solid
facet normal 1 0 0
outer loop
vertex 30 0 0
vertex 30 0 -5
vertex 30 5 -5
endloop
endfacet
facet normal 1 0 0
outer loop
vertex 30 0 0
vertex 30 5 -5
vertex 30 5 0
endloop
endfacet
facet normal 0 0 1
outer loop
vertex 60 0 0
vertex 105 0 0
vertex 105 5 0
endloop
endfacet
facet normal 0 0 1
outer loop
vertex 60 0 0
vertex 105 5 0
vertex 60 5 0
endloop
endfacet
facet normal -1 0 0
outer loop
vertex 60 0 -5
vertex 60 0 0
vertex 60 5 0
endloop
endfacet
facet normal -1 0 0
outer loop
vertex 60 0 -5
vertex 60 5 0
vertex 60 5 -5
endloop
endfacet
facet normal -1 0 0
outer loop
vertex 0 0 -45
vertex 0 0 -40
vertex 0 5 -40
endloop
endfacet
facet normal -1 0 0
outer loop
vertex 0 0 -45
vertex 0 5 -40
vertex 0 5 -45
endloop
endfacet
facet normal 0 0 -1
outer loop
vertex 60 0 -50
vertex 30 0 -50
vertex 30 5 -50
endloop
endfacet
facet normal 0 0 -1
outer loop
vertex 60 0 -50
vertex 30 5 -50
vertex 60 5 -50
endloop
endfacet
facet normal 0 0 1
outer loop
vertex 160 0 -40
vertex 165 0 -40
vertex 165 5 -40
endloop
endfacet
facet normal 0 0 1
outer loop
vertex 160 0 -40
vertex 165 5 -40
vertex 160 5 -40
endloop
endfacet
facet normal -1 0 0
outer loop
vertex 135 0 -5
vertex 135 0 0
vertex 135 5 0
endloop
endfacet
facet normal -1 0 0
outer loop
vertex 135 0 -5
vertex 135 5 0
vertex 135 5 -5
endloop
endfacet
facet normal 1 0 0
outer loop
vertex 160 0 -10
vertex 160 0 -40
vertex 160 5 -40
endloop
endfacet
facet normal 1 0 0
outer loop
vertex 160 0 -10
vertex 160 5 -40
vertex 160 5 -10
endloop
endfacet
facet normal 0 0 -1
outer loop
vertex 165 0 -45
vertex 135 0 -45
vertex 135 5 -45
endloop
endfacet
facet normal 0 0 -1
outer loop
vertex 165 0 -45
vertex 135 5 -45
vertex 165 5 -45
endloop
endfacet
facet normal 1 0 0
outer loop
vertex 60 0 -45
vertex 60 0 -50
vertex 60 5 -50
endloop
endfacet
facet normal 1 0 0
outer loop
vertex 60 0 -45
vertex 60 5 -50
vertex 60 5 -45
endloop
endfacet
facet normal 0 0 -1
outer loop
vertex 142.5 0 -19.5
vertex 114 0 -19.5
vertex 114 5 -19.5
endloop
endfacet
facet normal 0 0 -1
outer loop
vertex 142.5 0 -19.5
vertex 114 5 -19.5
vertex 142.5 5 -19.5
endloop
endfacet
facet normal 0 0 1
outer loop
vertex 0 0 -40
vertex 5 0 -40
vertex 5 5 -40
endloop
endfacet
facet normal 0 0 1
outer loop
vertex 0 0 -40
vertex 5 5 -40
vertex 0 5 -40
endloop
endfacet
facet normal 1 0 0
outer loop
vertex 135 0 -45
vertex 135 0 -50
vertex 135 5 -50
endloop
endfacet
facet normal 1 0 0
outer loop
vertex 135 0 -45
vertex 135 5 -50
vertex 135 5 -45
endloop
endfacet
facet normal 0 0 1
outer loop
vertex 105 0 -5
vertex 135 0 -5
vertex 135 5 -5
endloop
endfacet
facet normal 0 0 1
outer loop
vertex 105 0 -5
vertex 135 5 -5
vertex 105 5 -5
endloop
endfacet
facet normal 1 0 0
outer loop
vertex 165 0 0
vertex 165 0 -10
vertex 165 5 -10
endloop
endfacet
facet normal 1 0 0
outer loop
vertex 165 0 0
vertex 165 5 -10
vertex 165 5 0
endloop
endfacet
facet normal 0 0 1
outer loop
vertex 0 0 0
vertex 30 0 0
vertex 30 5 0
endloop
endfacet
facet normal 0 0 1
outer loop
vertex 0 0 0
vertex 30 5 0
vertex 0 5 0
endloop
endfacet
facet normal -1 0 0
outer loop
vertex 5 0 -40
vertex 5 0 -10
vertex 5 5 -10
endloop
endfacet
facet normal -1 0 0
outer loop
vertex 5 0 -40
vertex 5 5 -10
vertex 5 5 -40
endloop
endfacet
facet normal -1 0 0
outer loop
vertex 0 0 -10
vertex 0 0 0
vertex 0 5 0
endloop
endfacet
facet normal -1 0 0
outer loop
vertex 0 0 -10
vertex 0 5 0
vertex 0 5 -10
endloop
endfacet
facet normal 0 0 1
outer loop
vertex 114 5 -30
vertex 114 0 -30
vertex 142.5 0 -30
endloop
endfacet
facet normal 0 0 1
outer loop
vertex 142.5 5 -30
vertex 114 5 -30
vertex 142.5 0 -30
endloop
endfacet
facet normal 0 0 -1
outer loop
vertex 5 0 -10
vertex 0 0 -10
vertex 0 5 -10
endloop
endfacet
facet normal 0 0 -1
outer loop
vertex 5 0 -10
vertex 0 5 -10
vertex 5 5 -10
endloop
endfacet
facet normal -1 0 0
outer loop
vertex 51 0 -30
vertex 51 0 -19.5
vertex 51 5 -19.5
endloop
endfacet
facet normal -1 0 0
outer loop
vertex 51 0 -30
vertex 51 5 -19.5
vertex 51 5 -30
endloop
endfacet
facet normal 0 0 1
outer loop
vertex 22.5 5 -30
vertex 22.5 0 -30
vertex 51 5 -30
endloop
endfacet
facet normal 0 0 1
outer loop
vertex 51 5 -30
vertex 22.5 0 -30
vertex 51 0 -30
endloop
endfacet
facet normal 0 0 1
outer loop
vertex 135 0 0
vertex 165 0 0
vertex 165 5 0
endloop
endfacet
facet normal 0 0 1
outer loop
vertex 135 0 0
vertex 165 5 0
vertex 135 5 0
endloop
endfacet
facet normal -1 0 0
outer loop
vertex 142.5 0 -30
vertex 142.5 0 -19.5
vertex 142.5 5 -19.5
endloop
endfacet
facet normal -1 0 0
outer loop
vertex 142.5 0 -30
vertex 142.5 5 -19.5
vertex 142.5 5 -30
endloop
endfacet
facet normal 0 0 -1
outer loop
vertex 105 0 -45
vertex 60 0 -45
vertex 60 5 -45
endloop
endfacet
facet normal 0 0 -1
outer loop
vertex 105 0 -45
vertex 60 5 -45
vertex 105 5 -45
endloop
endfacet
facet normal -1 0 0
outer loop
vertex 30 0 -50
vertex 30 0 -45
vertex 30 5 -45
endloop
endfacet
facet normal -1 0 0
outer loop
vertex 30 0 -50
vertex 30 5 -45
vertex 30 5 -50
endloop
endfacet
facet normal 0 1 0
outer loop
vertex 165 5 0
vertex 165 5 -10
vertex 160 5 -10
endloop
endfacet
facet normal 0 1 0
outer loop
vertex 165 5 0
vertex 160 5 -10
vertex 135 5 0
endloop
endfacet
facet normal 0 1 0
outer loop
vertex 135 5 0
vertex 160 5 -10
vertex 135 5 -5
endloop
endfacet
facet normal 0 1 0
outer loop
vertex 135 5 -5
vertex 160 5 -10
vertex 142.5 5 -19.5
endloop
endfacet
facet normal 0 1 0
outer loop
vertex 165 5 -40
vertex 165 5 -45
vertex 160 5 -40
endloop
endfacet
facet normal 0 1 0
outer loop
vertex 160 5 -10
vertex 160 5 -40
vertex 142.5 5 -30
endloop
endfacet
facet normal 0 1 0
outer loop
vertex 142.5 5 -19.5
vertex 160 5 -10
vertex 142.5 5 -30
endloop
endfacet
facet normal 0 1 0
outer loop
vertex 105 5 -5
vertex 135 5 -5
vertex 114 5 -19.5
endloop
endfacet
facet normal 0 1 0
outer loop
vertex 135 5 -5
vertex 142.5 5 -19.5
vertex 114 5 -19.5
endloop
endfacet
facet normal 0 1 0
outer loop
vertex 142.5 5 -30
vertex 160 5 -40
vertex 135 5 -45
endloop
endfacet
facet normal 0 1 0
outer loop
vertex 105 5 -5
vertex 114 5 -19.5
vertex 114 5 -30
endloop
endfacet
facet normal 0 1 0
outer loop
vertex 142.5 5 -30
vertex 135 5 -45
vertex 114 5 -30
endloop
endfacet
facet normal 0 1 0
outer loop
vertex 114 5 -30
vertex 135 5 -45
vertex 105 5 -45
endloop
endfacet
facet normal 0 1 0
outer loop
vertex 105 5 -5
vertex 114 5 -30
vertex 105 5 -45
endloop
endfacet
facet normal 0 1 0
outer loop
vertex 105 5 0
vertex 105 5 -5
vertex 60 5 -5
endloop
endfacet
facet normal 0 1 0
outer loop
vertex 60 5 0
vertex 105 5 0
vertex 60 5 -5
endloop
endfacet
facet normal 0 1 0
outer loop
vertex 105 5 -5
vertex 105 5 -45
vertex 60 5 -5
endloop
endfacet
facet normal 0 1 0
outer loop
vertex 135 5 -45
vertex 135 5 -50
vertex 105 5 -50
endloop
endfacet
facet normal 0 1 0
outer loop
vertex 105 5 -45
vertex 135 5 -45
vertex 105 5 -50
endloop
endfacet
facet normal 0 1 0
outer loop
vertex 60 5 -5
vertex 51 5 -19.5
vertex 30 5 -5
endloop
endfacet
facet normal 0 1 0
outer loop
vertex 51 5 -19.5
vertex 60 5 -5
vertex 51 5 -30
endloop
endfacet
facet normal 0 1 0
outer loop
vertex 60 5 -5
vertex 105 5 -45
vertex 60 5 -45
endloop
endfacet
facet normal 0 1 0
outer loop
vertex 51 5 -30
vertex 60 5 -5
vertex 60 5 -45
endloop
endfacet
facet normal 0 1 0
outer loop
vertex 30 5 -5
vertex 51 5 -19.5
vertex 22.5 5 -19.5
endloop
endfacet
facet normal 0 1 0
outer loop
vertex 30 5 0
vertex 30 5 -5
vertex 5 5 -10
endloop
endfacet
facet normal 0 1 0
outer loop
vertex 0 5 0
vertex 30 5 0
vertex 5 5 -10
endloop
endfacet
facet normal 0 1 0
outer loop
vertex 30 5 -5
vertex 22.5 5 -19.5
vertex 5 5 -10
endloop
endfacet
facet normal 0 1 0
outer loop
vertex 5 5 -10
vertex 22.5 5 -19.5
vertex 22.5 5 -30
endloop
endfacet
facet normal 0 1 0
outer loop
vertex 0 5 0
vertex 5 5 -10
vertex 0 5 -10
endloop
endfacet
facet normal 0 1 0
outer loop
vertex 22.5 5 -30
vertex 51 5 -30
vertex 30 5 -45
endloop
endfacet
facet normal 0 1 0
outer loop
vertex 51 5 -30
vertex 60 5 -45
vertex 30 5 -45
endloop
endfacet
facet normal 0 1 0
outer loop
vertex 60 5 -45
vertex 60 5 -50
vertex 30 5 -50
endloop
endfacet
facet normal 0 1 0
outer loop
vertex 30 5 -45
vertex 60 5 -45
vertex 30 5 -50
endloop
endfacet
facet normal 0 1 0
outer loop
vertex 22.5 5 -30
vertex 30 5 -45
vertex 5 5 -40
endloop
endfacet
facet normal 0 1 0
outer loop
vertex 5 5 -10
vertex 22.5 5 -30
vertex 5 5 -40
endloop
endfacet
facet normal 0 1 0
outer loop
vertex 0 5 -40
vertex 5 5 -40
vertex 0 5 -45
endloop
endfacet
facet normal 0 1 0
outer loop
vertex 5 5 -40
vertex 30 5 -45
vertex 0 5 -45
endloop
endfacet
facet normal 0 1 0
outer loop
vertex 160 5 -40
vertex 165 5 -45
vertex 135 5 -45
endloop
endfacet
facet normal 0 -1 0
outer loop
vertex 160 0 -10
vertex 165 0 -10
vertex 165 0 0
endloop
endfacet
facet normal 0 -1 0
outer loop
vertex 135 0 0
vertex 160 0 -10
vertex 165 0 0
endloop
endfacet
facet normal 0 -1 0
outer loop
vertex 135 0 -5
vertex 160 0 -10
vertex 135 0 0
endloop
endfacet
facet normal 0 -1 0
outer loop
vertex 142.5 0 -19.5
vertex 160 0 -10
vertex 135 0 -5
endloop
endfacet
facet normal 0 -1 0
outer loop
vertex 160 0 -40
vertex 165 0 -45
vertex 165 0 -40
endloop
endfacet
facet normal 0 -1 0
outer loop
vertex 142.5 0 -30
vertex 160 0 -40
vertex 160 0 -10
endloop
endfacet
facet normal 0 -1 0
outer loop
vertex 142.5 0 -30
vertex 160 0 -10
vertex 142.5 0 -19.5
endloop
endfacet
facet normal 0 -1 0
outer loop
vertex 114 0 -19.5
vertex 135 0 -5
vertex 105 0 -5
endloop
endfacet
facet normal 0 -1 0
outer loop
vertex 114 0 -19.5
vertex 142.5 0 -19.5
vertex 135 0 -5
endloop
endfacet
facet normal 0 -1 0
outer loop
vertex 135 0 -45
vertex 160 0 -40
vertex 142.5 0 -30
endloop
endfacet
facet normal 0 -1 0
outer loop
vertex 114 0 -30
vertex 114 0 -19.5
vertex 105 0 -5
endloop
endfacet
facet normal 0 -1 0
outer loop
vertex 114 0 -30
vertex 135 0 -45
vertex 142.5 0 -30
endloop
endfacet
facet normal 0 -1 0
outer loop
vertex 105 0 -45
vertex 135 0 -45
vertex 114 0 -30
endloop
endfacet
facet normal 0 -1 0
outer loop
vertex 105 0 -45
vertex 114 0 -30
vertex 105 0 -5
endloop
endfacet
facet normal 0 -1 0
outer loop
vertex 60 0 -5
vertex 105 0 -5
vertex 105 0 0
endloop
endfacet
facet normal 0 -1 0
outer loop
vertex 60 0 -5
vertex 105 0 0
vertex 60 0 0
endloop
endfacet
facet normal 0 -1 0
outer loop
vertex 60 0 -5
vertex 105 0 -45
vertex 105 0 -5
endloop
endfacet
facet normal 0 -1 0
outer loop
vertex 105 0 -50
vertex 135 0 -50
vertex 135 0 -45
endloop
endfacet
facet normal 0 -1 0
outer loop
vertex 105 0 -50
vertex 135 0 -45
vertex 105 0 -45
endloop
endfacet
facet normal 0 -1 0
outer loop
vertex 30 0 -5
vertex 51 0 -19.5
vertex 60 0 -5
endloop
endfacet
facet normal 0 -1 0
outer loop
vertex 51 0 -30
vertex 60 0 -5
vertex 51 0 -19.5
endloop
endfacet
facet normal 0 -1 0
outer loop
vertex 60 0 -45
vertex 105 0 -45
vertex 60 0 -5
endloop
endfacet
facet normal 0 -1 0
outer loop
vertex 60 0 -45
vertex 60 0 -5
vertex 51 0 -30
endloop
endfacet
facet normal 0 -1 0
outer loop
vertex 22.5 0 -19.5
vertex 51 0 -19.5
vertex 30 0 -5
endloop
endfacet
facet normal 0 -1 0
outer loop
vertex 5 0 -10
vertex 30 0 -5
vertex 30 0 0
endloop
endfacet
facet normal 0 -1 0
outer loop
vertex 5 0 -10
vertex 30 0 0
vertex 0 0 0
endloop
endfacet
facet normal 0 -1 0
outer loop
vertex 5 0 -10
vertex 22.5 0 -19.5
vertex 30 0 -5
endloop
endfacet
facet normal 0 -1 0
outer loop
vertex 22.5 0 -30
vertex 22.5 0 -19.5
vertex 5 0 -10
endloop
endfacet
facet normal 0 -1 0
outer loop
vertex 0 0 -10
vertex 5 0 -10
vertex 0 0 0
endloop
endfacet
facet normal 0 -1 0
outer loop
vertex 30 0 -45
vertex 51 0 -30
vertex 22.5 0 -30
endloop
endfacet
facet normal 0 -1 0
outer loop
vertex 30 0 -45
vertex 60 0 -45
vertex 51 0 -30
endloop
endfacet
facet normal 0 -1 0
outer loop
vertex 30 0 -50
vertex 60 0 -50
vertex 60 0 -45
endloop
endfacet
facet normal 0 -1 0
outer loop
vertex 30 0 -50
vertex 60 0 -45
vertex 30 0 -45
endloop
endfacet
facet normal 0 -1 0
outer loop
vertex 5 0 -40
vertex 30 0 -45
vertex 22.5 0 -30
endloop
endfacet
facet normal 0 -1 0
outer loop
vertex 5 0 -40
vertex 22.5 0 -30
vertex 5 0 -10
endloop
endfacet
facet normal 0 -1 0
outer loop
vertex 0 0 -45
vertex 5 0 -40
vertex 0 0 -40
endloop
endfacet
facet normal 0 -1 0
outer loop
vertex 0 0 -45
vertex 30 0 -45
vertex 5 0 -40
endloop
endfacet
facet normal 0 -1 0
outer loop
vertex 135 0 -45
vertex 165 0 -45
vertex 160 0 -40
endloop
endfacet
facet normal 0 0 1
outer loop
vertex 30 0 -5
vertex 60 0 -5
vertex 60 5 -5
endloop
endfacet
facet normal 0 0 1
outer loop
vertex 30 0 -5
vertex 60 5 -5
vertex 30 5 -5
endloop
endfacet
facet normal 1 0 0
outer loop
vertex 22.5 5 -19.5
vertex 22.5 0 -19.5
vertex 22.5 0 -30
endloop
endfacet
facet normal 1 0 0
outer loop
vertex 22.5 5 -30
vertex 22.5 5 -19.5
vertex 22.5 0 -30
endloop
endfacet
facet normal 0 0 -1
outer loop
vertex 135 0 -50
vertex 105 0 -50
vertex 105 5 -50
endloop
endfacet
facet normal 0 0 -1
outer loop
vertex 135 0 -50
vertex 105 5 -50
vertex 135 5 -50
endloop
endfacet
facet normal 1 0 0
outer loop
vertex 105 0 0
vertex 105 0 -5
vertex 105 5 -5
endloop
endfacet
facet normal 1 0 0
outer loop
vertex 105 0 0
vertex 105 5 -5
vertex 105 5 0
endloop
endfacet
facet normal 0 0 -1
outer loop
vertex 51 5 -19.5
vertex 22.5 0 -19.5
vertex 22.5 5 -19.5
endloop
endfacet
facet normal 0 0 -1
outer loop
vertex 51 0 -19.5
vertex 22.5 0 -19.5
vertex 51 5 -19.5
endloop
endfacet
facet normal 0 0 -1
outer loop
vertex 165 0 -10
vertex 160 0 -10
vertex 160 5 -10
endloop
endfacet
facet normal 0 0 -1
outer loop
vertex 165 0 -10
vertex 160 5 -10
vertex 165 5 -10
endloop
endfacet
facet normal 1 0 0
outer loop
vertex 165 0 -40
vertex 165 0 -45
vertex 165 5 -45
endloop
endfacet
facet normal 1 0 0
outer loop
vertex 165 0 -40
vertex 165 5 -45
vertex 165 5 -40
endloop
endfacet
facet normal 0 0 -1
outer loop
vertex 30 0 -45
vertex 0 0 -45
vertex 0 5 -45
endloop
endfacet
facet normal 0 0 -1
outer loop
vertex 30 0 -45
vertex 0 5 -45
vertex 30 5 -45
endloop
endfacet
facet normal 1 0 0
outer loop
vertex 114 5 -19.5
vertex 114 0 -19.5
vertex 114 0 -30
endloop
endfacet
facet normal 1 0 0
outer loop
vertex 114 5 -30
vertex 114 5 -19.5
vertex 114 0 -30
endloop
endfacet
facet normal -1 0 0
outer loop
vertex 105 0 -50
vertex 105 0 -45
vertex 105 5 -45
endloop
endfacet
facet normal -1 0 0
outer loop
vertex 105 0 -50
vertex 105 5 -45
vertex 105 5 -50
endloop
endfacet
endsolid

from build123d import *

# Parameters (mm, degrees)
SKETCH1_W           = 28.5
SKETCH1_H           = 10.5
BOSS_EXTRUDE1_DEPTH = 5


with BuildPart() as part:
    # Sketch1 → Boss-Extrude1 (new body)
    with BuildSketch(Plane(origin=(0, 0, 0), x_dir=(1, 0, 0), z_dir=(0, 1, 0))):
        Polygon((0, 40), (0, 45), (30, 45), (30, 50), (60, 50), (60, 45), (105, 45), (105, 50), (135, 50), (135, 45), (165, 45), (165, 40), (160, 40), (160, 10), (165, 10), (165, 0), (135, 0), (135, 5), (105, 5), (105, 0), (60, 0), (60, 5), (30, 5), (30, 0), (0, 0), (0, 10), (5, 10), (5, 40), align=None)
        with Locations((36.75, 24.75)):
            Rectangle(SKETCH1_W, SKETCH1_H, mode=Mode.SUBTRACT)
        with Locations((128.25, 24.75)):
            Rectangle(SKETCH1_W, SKETCH1_H, mode=Mode.SUBTRACT)
    extrude(amount=BOSS_EXTRUDE1_DEPTH)


solid = part.part
